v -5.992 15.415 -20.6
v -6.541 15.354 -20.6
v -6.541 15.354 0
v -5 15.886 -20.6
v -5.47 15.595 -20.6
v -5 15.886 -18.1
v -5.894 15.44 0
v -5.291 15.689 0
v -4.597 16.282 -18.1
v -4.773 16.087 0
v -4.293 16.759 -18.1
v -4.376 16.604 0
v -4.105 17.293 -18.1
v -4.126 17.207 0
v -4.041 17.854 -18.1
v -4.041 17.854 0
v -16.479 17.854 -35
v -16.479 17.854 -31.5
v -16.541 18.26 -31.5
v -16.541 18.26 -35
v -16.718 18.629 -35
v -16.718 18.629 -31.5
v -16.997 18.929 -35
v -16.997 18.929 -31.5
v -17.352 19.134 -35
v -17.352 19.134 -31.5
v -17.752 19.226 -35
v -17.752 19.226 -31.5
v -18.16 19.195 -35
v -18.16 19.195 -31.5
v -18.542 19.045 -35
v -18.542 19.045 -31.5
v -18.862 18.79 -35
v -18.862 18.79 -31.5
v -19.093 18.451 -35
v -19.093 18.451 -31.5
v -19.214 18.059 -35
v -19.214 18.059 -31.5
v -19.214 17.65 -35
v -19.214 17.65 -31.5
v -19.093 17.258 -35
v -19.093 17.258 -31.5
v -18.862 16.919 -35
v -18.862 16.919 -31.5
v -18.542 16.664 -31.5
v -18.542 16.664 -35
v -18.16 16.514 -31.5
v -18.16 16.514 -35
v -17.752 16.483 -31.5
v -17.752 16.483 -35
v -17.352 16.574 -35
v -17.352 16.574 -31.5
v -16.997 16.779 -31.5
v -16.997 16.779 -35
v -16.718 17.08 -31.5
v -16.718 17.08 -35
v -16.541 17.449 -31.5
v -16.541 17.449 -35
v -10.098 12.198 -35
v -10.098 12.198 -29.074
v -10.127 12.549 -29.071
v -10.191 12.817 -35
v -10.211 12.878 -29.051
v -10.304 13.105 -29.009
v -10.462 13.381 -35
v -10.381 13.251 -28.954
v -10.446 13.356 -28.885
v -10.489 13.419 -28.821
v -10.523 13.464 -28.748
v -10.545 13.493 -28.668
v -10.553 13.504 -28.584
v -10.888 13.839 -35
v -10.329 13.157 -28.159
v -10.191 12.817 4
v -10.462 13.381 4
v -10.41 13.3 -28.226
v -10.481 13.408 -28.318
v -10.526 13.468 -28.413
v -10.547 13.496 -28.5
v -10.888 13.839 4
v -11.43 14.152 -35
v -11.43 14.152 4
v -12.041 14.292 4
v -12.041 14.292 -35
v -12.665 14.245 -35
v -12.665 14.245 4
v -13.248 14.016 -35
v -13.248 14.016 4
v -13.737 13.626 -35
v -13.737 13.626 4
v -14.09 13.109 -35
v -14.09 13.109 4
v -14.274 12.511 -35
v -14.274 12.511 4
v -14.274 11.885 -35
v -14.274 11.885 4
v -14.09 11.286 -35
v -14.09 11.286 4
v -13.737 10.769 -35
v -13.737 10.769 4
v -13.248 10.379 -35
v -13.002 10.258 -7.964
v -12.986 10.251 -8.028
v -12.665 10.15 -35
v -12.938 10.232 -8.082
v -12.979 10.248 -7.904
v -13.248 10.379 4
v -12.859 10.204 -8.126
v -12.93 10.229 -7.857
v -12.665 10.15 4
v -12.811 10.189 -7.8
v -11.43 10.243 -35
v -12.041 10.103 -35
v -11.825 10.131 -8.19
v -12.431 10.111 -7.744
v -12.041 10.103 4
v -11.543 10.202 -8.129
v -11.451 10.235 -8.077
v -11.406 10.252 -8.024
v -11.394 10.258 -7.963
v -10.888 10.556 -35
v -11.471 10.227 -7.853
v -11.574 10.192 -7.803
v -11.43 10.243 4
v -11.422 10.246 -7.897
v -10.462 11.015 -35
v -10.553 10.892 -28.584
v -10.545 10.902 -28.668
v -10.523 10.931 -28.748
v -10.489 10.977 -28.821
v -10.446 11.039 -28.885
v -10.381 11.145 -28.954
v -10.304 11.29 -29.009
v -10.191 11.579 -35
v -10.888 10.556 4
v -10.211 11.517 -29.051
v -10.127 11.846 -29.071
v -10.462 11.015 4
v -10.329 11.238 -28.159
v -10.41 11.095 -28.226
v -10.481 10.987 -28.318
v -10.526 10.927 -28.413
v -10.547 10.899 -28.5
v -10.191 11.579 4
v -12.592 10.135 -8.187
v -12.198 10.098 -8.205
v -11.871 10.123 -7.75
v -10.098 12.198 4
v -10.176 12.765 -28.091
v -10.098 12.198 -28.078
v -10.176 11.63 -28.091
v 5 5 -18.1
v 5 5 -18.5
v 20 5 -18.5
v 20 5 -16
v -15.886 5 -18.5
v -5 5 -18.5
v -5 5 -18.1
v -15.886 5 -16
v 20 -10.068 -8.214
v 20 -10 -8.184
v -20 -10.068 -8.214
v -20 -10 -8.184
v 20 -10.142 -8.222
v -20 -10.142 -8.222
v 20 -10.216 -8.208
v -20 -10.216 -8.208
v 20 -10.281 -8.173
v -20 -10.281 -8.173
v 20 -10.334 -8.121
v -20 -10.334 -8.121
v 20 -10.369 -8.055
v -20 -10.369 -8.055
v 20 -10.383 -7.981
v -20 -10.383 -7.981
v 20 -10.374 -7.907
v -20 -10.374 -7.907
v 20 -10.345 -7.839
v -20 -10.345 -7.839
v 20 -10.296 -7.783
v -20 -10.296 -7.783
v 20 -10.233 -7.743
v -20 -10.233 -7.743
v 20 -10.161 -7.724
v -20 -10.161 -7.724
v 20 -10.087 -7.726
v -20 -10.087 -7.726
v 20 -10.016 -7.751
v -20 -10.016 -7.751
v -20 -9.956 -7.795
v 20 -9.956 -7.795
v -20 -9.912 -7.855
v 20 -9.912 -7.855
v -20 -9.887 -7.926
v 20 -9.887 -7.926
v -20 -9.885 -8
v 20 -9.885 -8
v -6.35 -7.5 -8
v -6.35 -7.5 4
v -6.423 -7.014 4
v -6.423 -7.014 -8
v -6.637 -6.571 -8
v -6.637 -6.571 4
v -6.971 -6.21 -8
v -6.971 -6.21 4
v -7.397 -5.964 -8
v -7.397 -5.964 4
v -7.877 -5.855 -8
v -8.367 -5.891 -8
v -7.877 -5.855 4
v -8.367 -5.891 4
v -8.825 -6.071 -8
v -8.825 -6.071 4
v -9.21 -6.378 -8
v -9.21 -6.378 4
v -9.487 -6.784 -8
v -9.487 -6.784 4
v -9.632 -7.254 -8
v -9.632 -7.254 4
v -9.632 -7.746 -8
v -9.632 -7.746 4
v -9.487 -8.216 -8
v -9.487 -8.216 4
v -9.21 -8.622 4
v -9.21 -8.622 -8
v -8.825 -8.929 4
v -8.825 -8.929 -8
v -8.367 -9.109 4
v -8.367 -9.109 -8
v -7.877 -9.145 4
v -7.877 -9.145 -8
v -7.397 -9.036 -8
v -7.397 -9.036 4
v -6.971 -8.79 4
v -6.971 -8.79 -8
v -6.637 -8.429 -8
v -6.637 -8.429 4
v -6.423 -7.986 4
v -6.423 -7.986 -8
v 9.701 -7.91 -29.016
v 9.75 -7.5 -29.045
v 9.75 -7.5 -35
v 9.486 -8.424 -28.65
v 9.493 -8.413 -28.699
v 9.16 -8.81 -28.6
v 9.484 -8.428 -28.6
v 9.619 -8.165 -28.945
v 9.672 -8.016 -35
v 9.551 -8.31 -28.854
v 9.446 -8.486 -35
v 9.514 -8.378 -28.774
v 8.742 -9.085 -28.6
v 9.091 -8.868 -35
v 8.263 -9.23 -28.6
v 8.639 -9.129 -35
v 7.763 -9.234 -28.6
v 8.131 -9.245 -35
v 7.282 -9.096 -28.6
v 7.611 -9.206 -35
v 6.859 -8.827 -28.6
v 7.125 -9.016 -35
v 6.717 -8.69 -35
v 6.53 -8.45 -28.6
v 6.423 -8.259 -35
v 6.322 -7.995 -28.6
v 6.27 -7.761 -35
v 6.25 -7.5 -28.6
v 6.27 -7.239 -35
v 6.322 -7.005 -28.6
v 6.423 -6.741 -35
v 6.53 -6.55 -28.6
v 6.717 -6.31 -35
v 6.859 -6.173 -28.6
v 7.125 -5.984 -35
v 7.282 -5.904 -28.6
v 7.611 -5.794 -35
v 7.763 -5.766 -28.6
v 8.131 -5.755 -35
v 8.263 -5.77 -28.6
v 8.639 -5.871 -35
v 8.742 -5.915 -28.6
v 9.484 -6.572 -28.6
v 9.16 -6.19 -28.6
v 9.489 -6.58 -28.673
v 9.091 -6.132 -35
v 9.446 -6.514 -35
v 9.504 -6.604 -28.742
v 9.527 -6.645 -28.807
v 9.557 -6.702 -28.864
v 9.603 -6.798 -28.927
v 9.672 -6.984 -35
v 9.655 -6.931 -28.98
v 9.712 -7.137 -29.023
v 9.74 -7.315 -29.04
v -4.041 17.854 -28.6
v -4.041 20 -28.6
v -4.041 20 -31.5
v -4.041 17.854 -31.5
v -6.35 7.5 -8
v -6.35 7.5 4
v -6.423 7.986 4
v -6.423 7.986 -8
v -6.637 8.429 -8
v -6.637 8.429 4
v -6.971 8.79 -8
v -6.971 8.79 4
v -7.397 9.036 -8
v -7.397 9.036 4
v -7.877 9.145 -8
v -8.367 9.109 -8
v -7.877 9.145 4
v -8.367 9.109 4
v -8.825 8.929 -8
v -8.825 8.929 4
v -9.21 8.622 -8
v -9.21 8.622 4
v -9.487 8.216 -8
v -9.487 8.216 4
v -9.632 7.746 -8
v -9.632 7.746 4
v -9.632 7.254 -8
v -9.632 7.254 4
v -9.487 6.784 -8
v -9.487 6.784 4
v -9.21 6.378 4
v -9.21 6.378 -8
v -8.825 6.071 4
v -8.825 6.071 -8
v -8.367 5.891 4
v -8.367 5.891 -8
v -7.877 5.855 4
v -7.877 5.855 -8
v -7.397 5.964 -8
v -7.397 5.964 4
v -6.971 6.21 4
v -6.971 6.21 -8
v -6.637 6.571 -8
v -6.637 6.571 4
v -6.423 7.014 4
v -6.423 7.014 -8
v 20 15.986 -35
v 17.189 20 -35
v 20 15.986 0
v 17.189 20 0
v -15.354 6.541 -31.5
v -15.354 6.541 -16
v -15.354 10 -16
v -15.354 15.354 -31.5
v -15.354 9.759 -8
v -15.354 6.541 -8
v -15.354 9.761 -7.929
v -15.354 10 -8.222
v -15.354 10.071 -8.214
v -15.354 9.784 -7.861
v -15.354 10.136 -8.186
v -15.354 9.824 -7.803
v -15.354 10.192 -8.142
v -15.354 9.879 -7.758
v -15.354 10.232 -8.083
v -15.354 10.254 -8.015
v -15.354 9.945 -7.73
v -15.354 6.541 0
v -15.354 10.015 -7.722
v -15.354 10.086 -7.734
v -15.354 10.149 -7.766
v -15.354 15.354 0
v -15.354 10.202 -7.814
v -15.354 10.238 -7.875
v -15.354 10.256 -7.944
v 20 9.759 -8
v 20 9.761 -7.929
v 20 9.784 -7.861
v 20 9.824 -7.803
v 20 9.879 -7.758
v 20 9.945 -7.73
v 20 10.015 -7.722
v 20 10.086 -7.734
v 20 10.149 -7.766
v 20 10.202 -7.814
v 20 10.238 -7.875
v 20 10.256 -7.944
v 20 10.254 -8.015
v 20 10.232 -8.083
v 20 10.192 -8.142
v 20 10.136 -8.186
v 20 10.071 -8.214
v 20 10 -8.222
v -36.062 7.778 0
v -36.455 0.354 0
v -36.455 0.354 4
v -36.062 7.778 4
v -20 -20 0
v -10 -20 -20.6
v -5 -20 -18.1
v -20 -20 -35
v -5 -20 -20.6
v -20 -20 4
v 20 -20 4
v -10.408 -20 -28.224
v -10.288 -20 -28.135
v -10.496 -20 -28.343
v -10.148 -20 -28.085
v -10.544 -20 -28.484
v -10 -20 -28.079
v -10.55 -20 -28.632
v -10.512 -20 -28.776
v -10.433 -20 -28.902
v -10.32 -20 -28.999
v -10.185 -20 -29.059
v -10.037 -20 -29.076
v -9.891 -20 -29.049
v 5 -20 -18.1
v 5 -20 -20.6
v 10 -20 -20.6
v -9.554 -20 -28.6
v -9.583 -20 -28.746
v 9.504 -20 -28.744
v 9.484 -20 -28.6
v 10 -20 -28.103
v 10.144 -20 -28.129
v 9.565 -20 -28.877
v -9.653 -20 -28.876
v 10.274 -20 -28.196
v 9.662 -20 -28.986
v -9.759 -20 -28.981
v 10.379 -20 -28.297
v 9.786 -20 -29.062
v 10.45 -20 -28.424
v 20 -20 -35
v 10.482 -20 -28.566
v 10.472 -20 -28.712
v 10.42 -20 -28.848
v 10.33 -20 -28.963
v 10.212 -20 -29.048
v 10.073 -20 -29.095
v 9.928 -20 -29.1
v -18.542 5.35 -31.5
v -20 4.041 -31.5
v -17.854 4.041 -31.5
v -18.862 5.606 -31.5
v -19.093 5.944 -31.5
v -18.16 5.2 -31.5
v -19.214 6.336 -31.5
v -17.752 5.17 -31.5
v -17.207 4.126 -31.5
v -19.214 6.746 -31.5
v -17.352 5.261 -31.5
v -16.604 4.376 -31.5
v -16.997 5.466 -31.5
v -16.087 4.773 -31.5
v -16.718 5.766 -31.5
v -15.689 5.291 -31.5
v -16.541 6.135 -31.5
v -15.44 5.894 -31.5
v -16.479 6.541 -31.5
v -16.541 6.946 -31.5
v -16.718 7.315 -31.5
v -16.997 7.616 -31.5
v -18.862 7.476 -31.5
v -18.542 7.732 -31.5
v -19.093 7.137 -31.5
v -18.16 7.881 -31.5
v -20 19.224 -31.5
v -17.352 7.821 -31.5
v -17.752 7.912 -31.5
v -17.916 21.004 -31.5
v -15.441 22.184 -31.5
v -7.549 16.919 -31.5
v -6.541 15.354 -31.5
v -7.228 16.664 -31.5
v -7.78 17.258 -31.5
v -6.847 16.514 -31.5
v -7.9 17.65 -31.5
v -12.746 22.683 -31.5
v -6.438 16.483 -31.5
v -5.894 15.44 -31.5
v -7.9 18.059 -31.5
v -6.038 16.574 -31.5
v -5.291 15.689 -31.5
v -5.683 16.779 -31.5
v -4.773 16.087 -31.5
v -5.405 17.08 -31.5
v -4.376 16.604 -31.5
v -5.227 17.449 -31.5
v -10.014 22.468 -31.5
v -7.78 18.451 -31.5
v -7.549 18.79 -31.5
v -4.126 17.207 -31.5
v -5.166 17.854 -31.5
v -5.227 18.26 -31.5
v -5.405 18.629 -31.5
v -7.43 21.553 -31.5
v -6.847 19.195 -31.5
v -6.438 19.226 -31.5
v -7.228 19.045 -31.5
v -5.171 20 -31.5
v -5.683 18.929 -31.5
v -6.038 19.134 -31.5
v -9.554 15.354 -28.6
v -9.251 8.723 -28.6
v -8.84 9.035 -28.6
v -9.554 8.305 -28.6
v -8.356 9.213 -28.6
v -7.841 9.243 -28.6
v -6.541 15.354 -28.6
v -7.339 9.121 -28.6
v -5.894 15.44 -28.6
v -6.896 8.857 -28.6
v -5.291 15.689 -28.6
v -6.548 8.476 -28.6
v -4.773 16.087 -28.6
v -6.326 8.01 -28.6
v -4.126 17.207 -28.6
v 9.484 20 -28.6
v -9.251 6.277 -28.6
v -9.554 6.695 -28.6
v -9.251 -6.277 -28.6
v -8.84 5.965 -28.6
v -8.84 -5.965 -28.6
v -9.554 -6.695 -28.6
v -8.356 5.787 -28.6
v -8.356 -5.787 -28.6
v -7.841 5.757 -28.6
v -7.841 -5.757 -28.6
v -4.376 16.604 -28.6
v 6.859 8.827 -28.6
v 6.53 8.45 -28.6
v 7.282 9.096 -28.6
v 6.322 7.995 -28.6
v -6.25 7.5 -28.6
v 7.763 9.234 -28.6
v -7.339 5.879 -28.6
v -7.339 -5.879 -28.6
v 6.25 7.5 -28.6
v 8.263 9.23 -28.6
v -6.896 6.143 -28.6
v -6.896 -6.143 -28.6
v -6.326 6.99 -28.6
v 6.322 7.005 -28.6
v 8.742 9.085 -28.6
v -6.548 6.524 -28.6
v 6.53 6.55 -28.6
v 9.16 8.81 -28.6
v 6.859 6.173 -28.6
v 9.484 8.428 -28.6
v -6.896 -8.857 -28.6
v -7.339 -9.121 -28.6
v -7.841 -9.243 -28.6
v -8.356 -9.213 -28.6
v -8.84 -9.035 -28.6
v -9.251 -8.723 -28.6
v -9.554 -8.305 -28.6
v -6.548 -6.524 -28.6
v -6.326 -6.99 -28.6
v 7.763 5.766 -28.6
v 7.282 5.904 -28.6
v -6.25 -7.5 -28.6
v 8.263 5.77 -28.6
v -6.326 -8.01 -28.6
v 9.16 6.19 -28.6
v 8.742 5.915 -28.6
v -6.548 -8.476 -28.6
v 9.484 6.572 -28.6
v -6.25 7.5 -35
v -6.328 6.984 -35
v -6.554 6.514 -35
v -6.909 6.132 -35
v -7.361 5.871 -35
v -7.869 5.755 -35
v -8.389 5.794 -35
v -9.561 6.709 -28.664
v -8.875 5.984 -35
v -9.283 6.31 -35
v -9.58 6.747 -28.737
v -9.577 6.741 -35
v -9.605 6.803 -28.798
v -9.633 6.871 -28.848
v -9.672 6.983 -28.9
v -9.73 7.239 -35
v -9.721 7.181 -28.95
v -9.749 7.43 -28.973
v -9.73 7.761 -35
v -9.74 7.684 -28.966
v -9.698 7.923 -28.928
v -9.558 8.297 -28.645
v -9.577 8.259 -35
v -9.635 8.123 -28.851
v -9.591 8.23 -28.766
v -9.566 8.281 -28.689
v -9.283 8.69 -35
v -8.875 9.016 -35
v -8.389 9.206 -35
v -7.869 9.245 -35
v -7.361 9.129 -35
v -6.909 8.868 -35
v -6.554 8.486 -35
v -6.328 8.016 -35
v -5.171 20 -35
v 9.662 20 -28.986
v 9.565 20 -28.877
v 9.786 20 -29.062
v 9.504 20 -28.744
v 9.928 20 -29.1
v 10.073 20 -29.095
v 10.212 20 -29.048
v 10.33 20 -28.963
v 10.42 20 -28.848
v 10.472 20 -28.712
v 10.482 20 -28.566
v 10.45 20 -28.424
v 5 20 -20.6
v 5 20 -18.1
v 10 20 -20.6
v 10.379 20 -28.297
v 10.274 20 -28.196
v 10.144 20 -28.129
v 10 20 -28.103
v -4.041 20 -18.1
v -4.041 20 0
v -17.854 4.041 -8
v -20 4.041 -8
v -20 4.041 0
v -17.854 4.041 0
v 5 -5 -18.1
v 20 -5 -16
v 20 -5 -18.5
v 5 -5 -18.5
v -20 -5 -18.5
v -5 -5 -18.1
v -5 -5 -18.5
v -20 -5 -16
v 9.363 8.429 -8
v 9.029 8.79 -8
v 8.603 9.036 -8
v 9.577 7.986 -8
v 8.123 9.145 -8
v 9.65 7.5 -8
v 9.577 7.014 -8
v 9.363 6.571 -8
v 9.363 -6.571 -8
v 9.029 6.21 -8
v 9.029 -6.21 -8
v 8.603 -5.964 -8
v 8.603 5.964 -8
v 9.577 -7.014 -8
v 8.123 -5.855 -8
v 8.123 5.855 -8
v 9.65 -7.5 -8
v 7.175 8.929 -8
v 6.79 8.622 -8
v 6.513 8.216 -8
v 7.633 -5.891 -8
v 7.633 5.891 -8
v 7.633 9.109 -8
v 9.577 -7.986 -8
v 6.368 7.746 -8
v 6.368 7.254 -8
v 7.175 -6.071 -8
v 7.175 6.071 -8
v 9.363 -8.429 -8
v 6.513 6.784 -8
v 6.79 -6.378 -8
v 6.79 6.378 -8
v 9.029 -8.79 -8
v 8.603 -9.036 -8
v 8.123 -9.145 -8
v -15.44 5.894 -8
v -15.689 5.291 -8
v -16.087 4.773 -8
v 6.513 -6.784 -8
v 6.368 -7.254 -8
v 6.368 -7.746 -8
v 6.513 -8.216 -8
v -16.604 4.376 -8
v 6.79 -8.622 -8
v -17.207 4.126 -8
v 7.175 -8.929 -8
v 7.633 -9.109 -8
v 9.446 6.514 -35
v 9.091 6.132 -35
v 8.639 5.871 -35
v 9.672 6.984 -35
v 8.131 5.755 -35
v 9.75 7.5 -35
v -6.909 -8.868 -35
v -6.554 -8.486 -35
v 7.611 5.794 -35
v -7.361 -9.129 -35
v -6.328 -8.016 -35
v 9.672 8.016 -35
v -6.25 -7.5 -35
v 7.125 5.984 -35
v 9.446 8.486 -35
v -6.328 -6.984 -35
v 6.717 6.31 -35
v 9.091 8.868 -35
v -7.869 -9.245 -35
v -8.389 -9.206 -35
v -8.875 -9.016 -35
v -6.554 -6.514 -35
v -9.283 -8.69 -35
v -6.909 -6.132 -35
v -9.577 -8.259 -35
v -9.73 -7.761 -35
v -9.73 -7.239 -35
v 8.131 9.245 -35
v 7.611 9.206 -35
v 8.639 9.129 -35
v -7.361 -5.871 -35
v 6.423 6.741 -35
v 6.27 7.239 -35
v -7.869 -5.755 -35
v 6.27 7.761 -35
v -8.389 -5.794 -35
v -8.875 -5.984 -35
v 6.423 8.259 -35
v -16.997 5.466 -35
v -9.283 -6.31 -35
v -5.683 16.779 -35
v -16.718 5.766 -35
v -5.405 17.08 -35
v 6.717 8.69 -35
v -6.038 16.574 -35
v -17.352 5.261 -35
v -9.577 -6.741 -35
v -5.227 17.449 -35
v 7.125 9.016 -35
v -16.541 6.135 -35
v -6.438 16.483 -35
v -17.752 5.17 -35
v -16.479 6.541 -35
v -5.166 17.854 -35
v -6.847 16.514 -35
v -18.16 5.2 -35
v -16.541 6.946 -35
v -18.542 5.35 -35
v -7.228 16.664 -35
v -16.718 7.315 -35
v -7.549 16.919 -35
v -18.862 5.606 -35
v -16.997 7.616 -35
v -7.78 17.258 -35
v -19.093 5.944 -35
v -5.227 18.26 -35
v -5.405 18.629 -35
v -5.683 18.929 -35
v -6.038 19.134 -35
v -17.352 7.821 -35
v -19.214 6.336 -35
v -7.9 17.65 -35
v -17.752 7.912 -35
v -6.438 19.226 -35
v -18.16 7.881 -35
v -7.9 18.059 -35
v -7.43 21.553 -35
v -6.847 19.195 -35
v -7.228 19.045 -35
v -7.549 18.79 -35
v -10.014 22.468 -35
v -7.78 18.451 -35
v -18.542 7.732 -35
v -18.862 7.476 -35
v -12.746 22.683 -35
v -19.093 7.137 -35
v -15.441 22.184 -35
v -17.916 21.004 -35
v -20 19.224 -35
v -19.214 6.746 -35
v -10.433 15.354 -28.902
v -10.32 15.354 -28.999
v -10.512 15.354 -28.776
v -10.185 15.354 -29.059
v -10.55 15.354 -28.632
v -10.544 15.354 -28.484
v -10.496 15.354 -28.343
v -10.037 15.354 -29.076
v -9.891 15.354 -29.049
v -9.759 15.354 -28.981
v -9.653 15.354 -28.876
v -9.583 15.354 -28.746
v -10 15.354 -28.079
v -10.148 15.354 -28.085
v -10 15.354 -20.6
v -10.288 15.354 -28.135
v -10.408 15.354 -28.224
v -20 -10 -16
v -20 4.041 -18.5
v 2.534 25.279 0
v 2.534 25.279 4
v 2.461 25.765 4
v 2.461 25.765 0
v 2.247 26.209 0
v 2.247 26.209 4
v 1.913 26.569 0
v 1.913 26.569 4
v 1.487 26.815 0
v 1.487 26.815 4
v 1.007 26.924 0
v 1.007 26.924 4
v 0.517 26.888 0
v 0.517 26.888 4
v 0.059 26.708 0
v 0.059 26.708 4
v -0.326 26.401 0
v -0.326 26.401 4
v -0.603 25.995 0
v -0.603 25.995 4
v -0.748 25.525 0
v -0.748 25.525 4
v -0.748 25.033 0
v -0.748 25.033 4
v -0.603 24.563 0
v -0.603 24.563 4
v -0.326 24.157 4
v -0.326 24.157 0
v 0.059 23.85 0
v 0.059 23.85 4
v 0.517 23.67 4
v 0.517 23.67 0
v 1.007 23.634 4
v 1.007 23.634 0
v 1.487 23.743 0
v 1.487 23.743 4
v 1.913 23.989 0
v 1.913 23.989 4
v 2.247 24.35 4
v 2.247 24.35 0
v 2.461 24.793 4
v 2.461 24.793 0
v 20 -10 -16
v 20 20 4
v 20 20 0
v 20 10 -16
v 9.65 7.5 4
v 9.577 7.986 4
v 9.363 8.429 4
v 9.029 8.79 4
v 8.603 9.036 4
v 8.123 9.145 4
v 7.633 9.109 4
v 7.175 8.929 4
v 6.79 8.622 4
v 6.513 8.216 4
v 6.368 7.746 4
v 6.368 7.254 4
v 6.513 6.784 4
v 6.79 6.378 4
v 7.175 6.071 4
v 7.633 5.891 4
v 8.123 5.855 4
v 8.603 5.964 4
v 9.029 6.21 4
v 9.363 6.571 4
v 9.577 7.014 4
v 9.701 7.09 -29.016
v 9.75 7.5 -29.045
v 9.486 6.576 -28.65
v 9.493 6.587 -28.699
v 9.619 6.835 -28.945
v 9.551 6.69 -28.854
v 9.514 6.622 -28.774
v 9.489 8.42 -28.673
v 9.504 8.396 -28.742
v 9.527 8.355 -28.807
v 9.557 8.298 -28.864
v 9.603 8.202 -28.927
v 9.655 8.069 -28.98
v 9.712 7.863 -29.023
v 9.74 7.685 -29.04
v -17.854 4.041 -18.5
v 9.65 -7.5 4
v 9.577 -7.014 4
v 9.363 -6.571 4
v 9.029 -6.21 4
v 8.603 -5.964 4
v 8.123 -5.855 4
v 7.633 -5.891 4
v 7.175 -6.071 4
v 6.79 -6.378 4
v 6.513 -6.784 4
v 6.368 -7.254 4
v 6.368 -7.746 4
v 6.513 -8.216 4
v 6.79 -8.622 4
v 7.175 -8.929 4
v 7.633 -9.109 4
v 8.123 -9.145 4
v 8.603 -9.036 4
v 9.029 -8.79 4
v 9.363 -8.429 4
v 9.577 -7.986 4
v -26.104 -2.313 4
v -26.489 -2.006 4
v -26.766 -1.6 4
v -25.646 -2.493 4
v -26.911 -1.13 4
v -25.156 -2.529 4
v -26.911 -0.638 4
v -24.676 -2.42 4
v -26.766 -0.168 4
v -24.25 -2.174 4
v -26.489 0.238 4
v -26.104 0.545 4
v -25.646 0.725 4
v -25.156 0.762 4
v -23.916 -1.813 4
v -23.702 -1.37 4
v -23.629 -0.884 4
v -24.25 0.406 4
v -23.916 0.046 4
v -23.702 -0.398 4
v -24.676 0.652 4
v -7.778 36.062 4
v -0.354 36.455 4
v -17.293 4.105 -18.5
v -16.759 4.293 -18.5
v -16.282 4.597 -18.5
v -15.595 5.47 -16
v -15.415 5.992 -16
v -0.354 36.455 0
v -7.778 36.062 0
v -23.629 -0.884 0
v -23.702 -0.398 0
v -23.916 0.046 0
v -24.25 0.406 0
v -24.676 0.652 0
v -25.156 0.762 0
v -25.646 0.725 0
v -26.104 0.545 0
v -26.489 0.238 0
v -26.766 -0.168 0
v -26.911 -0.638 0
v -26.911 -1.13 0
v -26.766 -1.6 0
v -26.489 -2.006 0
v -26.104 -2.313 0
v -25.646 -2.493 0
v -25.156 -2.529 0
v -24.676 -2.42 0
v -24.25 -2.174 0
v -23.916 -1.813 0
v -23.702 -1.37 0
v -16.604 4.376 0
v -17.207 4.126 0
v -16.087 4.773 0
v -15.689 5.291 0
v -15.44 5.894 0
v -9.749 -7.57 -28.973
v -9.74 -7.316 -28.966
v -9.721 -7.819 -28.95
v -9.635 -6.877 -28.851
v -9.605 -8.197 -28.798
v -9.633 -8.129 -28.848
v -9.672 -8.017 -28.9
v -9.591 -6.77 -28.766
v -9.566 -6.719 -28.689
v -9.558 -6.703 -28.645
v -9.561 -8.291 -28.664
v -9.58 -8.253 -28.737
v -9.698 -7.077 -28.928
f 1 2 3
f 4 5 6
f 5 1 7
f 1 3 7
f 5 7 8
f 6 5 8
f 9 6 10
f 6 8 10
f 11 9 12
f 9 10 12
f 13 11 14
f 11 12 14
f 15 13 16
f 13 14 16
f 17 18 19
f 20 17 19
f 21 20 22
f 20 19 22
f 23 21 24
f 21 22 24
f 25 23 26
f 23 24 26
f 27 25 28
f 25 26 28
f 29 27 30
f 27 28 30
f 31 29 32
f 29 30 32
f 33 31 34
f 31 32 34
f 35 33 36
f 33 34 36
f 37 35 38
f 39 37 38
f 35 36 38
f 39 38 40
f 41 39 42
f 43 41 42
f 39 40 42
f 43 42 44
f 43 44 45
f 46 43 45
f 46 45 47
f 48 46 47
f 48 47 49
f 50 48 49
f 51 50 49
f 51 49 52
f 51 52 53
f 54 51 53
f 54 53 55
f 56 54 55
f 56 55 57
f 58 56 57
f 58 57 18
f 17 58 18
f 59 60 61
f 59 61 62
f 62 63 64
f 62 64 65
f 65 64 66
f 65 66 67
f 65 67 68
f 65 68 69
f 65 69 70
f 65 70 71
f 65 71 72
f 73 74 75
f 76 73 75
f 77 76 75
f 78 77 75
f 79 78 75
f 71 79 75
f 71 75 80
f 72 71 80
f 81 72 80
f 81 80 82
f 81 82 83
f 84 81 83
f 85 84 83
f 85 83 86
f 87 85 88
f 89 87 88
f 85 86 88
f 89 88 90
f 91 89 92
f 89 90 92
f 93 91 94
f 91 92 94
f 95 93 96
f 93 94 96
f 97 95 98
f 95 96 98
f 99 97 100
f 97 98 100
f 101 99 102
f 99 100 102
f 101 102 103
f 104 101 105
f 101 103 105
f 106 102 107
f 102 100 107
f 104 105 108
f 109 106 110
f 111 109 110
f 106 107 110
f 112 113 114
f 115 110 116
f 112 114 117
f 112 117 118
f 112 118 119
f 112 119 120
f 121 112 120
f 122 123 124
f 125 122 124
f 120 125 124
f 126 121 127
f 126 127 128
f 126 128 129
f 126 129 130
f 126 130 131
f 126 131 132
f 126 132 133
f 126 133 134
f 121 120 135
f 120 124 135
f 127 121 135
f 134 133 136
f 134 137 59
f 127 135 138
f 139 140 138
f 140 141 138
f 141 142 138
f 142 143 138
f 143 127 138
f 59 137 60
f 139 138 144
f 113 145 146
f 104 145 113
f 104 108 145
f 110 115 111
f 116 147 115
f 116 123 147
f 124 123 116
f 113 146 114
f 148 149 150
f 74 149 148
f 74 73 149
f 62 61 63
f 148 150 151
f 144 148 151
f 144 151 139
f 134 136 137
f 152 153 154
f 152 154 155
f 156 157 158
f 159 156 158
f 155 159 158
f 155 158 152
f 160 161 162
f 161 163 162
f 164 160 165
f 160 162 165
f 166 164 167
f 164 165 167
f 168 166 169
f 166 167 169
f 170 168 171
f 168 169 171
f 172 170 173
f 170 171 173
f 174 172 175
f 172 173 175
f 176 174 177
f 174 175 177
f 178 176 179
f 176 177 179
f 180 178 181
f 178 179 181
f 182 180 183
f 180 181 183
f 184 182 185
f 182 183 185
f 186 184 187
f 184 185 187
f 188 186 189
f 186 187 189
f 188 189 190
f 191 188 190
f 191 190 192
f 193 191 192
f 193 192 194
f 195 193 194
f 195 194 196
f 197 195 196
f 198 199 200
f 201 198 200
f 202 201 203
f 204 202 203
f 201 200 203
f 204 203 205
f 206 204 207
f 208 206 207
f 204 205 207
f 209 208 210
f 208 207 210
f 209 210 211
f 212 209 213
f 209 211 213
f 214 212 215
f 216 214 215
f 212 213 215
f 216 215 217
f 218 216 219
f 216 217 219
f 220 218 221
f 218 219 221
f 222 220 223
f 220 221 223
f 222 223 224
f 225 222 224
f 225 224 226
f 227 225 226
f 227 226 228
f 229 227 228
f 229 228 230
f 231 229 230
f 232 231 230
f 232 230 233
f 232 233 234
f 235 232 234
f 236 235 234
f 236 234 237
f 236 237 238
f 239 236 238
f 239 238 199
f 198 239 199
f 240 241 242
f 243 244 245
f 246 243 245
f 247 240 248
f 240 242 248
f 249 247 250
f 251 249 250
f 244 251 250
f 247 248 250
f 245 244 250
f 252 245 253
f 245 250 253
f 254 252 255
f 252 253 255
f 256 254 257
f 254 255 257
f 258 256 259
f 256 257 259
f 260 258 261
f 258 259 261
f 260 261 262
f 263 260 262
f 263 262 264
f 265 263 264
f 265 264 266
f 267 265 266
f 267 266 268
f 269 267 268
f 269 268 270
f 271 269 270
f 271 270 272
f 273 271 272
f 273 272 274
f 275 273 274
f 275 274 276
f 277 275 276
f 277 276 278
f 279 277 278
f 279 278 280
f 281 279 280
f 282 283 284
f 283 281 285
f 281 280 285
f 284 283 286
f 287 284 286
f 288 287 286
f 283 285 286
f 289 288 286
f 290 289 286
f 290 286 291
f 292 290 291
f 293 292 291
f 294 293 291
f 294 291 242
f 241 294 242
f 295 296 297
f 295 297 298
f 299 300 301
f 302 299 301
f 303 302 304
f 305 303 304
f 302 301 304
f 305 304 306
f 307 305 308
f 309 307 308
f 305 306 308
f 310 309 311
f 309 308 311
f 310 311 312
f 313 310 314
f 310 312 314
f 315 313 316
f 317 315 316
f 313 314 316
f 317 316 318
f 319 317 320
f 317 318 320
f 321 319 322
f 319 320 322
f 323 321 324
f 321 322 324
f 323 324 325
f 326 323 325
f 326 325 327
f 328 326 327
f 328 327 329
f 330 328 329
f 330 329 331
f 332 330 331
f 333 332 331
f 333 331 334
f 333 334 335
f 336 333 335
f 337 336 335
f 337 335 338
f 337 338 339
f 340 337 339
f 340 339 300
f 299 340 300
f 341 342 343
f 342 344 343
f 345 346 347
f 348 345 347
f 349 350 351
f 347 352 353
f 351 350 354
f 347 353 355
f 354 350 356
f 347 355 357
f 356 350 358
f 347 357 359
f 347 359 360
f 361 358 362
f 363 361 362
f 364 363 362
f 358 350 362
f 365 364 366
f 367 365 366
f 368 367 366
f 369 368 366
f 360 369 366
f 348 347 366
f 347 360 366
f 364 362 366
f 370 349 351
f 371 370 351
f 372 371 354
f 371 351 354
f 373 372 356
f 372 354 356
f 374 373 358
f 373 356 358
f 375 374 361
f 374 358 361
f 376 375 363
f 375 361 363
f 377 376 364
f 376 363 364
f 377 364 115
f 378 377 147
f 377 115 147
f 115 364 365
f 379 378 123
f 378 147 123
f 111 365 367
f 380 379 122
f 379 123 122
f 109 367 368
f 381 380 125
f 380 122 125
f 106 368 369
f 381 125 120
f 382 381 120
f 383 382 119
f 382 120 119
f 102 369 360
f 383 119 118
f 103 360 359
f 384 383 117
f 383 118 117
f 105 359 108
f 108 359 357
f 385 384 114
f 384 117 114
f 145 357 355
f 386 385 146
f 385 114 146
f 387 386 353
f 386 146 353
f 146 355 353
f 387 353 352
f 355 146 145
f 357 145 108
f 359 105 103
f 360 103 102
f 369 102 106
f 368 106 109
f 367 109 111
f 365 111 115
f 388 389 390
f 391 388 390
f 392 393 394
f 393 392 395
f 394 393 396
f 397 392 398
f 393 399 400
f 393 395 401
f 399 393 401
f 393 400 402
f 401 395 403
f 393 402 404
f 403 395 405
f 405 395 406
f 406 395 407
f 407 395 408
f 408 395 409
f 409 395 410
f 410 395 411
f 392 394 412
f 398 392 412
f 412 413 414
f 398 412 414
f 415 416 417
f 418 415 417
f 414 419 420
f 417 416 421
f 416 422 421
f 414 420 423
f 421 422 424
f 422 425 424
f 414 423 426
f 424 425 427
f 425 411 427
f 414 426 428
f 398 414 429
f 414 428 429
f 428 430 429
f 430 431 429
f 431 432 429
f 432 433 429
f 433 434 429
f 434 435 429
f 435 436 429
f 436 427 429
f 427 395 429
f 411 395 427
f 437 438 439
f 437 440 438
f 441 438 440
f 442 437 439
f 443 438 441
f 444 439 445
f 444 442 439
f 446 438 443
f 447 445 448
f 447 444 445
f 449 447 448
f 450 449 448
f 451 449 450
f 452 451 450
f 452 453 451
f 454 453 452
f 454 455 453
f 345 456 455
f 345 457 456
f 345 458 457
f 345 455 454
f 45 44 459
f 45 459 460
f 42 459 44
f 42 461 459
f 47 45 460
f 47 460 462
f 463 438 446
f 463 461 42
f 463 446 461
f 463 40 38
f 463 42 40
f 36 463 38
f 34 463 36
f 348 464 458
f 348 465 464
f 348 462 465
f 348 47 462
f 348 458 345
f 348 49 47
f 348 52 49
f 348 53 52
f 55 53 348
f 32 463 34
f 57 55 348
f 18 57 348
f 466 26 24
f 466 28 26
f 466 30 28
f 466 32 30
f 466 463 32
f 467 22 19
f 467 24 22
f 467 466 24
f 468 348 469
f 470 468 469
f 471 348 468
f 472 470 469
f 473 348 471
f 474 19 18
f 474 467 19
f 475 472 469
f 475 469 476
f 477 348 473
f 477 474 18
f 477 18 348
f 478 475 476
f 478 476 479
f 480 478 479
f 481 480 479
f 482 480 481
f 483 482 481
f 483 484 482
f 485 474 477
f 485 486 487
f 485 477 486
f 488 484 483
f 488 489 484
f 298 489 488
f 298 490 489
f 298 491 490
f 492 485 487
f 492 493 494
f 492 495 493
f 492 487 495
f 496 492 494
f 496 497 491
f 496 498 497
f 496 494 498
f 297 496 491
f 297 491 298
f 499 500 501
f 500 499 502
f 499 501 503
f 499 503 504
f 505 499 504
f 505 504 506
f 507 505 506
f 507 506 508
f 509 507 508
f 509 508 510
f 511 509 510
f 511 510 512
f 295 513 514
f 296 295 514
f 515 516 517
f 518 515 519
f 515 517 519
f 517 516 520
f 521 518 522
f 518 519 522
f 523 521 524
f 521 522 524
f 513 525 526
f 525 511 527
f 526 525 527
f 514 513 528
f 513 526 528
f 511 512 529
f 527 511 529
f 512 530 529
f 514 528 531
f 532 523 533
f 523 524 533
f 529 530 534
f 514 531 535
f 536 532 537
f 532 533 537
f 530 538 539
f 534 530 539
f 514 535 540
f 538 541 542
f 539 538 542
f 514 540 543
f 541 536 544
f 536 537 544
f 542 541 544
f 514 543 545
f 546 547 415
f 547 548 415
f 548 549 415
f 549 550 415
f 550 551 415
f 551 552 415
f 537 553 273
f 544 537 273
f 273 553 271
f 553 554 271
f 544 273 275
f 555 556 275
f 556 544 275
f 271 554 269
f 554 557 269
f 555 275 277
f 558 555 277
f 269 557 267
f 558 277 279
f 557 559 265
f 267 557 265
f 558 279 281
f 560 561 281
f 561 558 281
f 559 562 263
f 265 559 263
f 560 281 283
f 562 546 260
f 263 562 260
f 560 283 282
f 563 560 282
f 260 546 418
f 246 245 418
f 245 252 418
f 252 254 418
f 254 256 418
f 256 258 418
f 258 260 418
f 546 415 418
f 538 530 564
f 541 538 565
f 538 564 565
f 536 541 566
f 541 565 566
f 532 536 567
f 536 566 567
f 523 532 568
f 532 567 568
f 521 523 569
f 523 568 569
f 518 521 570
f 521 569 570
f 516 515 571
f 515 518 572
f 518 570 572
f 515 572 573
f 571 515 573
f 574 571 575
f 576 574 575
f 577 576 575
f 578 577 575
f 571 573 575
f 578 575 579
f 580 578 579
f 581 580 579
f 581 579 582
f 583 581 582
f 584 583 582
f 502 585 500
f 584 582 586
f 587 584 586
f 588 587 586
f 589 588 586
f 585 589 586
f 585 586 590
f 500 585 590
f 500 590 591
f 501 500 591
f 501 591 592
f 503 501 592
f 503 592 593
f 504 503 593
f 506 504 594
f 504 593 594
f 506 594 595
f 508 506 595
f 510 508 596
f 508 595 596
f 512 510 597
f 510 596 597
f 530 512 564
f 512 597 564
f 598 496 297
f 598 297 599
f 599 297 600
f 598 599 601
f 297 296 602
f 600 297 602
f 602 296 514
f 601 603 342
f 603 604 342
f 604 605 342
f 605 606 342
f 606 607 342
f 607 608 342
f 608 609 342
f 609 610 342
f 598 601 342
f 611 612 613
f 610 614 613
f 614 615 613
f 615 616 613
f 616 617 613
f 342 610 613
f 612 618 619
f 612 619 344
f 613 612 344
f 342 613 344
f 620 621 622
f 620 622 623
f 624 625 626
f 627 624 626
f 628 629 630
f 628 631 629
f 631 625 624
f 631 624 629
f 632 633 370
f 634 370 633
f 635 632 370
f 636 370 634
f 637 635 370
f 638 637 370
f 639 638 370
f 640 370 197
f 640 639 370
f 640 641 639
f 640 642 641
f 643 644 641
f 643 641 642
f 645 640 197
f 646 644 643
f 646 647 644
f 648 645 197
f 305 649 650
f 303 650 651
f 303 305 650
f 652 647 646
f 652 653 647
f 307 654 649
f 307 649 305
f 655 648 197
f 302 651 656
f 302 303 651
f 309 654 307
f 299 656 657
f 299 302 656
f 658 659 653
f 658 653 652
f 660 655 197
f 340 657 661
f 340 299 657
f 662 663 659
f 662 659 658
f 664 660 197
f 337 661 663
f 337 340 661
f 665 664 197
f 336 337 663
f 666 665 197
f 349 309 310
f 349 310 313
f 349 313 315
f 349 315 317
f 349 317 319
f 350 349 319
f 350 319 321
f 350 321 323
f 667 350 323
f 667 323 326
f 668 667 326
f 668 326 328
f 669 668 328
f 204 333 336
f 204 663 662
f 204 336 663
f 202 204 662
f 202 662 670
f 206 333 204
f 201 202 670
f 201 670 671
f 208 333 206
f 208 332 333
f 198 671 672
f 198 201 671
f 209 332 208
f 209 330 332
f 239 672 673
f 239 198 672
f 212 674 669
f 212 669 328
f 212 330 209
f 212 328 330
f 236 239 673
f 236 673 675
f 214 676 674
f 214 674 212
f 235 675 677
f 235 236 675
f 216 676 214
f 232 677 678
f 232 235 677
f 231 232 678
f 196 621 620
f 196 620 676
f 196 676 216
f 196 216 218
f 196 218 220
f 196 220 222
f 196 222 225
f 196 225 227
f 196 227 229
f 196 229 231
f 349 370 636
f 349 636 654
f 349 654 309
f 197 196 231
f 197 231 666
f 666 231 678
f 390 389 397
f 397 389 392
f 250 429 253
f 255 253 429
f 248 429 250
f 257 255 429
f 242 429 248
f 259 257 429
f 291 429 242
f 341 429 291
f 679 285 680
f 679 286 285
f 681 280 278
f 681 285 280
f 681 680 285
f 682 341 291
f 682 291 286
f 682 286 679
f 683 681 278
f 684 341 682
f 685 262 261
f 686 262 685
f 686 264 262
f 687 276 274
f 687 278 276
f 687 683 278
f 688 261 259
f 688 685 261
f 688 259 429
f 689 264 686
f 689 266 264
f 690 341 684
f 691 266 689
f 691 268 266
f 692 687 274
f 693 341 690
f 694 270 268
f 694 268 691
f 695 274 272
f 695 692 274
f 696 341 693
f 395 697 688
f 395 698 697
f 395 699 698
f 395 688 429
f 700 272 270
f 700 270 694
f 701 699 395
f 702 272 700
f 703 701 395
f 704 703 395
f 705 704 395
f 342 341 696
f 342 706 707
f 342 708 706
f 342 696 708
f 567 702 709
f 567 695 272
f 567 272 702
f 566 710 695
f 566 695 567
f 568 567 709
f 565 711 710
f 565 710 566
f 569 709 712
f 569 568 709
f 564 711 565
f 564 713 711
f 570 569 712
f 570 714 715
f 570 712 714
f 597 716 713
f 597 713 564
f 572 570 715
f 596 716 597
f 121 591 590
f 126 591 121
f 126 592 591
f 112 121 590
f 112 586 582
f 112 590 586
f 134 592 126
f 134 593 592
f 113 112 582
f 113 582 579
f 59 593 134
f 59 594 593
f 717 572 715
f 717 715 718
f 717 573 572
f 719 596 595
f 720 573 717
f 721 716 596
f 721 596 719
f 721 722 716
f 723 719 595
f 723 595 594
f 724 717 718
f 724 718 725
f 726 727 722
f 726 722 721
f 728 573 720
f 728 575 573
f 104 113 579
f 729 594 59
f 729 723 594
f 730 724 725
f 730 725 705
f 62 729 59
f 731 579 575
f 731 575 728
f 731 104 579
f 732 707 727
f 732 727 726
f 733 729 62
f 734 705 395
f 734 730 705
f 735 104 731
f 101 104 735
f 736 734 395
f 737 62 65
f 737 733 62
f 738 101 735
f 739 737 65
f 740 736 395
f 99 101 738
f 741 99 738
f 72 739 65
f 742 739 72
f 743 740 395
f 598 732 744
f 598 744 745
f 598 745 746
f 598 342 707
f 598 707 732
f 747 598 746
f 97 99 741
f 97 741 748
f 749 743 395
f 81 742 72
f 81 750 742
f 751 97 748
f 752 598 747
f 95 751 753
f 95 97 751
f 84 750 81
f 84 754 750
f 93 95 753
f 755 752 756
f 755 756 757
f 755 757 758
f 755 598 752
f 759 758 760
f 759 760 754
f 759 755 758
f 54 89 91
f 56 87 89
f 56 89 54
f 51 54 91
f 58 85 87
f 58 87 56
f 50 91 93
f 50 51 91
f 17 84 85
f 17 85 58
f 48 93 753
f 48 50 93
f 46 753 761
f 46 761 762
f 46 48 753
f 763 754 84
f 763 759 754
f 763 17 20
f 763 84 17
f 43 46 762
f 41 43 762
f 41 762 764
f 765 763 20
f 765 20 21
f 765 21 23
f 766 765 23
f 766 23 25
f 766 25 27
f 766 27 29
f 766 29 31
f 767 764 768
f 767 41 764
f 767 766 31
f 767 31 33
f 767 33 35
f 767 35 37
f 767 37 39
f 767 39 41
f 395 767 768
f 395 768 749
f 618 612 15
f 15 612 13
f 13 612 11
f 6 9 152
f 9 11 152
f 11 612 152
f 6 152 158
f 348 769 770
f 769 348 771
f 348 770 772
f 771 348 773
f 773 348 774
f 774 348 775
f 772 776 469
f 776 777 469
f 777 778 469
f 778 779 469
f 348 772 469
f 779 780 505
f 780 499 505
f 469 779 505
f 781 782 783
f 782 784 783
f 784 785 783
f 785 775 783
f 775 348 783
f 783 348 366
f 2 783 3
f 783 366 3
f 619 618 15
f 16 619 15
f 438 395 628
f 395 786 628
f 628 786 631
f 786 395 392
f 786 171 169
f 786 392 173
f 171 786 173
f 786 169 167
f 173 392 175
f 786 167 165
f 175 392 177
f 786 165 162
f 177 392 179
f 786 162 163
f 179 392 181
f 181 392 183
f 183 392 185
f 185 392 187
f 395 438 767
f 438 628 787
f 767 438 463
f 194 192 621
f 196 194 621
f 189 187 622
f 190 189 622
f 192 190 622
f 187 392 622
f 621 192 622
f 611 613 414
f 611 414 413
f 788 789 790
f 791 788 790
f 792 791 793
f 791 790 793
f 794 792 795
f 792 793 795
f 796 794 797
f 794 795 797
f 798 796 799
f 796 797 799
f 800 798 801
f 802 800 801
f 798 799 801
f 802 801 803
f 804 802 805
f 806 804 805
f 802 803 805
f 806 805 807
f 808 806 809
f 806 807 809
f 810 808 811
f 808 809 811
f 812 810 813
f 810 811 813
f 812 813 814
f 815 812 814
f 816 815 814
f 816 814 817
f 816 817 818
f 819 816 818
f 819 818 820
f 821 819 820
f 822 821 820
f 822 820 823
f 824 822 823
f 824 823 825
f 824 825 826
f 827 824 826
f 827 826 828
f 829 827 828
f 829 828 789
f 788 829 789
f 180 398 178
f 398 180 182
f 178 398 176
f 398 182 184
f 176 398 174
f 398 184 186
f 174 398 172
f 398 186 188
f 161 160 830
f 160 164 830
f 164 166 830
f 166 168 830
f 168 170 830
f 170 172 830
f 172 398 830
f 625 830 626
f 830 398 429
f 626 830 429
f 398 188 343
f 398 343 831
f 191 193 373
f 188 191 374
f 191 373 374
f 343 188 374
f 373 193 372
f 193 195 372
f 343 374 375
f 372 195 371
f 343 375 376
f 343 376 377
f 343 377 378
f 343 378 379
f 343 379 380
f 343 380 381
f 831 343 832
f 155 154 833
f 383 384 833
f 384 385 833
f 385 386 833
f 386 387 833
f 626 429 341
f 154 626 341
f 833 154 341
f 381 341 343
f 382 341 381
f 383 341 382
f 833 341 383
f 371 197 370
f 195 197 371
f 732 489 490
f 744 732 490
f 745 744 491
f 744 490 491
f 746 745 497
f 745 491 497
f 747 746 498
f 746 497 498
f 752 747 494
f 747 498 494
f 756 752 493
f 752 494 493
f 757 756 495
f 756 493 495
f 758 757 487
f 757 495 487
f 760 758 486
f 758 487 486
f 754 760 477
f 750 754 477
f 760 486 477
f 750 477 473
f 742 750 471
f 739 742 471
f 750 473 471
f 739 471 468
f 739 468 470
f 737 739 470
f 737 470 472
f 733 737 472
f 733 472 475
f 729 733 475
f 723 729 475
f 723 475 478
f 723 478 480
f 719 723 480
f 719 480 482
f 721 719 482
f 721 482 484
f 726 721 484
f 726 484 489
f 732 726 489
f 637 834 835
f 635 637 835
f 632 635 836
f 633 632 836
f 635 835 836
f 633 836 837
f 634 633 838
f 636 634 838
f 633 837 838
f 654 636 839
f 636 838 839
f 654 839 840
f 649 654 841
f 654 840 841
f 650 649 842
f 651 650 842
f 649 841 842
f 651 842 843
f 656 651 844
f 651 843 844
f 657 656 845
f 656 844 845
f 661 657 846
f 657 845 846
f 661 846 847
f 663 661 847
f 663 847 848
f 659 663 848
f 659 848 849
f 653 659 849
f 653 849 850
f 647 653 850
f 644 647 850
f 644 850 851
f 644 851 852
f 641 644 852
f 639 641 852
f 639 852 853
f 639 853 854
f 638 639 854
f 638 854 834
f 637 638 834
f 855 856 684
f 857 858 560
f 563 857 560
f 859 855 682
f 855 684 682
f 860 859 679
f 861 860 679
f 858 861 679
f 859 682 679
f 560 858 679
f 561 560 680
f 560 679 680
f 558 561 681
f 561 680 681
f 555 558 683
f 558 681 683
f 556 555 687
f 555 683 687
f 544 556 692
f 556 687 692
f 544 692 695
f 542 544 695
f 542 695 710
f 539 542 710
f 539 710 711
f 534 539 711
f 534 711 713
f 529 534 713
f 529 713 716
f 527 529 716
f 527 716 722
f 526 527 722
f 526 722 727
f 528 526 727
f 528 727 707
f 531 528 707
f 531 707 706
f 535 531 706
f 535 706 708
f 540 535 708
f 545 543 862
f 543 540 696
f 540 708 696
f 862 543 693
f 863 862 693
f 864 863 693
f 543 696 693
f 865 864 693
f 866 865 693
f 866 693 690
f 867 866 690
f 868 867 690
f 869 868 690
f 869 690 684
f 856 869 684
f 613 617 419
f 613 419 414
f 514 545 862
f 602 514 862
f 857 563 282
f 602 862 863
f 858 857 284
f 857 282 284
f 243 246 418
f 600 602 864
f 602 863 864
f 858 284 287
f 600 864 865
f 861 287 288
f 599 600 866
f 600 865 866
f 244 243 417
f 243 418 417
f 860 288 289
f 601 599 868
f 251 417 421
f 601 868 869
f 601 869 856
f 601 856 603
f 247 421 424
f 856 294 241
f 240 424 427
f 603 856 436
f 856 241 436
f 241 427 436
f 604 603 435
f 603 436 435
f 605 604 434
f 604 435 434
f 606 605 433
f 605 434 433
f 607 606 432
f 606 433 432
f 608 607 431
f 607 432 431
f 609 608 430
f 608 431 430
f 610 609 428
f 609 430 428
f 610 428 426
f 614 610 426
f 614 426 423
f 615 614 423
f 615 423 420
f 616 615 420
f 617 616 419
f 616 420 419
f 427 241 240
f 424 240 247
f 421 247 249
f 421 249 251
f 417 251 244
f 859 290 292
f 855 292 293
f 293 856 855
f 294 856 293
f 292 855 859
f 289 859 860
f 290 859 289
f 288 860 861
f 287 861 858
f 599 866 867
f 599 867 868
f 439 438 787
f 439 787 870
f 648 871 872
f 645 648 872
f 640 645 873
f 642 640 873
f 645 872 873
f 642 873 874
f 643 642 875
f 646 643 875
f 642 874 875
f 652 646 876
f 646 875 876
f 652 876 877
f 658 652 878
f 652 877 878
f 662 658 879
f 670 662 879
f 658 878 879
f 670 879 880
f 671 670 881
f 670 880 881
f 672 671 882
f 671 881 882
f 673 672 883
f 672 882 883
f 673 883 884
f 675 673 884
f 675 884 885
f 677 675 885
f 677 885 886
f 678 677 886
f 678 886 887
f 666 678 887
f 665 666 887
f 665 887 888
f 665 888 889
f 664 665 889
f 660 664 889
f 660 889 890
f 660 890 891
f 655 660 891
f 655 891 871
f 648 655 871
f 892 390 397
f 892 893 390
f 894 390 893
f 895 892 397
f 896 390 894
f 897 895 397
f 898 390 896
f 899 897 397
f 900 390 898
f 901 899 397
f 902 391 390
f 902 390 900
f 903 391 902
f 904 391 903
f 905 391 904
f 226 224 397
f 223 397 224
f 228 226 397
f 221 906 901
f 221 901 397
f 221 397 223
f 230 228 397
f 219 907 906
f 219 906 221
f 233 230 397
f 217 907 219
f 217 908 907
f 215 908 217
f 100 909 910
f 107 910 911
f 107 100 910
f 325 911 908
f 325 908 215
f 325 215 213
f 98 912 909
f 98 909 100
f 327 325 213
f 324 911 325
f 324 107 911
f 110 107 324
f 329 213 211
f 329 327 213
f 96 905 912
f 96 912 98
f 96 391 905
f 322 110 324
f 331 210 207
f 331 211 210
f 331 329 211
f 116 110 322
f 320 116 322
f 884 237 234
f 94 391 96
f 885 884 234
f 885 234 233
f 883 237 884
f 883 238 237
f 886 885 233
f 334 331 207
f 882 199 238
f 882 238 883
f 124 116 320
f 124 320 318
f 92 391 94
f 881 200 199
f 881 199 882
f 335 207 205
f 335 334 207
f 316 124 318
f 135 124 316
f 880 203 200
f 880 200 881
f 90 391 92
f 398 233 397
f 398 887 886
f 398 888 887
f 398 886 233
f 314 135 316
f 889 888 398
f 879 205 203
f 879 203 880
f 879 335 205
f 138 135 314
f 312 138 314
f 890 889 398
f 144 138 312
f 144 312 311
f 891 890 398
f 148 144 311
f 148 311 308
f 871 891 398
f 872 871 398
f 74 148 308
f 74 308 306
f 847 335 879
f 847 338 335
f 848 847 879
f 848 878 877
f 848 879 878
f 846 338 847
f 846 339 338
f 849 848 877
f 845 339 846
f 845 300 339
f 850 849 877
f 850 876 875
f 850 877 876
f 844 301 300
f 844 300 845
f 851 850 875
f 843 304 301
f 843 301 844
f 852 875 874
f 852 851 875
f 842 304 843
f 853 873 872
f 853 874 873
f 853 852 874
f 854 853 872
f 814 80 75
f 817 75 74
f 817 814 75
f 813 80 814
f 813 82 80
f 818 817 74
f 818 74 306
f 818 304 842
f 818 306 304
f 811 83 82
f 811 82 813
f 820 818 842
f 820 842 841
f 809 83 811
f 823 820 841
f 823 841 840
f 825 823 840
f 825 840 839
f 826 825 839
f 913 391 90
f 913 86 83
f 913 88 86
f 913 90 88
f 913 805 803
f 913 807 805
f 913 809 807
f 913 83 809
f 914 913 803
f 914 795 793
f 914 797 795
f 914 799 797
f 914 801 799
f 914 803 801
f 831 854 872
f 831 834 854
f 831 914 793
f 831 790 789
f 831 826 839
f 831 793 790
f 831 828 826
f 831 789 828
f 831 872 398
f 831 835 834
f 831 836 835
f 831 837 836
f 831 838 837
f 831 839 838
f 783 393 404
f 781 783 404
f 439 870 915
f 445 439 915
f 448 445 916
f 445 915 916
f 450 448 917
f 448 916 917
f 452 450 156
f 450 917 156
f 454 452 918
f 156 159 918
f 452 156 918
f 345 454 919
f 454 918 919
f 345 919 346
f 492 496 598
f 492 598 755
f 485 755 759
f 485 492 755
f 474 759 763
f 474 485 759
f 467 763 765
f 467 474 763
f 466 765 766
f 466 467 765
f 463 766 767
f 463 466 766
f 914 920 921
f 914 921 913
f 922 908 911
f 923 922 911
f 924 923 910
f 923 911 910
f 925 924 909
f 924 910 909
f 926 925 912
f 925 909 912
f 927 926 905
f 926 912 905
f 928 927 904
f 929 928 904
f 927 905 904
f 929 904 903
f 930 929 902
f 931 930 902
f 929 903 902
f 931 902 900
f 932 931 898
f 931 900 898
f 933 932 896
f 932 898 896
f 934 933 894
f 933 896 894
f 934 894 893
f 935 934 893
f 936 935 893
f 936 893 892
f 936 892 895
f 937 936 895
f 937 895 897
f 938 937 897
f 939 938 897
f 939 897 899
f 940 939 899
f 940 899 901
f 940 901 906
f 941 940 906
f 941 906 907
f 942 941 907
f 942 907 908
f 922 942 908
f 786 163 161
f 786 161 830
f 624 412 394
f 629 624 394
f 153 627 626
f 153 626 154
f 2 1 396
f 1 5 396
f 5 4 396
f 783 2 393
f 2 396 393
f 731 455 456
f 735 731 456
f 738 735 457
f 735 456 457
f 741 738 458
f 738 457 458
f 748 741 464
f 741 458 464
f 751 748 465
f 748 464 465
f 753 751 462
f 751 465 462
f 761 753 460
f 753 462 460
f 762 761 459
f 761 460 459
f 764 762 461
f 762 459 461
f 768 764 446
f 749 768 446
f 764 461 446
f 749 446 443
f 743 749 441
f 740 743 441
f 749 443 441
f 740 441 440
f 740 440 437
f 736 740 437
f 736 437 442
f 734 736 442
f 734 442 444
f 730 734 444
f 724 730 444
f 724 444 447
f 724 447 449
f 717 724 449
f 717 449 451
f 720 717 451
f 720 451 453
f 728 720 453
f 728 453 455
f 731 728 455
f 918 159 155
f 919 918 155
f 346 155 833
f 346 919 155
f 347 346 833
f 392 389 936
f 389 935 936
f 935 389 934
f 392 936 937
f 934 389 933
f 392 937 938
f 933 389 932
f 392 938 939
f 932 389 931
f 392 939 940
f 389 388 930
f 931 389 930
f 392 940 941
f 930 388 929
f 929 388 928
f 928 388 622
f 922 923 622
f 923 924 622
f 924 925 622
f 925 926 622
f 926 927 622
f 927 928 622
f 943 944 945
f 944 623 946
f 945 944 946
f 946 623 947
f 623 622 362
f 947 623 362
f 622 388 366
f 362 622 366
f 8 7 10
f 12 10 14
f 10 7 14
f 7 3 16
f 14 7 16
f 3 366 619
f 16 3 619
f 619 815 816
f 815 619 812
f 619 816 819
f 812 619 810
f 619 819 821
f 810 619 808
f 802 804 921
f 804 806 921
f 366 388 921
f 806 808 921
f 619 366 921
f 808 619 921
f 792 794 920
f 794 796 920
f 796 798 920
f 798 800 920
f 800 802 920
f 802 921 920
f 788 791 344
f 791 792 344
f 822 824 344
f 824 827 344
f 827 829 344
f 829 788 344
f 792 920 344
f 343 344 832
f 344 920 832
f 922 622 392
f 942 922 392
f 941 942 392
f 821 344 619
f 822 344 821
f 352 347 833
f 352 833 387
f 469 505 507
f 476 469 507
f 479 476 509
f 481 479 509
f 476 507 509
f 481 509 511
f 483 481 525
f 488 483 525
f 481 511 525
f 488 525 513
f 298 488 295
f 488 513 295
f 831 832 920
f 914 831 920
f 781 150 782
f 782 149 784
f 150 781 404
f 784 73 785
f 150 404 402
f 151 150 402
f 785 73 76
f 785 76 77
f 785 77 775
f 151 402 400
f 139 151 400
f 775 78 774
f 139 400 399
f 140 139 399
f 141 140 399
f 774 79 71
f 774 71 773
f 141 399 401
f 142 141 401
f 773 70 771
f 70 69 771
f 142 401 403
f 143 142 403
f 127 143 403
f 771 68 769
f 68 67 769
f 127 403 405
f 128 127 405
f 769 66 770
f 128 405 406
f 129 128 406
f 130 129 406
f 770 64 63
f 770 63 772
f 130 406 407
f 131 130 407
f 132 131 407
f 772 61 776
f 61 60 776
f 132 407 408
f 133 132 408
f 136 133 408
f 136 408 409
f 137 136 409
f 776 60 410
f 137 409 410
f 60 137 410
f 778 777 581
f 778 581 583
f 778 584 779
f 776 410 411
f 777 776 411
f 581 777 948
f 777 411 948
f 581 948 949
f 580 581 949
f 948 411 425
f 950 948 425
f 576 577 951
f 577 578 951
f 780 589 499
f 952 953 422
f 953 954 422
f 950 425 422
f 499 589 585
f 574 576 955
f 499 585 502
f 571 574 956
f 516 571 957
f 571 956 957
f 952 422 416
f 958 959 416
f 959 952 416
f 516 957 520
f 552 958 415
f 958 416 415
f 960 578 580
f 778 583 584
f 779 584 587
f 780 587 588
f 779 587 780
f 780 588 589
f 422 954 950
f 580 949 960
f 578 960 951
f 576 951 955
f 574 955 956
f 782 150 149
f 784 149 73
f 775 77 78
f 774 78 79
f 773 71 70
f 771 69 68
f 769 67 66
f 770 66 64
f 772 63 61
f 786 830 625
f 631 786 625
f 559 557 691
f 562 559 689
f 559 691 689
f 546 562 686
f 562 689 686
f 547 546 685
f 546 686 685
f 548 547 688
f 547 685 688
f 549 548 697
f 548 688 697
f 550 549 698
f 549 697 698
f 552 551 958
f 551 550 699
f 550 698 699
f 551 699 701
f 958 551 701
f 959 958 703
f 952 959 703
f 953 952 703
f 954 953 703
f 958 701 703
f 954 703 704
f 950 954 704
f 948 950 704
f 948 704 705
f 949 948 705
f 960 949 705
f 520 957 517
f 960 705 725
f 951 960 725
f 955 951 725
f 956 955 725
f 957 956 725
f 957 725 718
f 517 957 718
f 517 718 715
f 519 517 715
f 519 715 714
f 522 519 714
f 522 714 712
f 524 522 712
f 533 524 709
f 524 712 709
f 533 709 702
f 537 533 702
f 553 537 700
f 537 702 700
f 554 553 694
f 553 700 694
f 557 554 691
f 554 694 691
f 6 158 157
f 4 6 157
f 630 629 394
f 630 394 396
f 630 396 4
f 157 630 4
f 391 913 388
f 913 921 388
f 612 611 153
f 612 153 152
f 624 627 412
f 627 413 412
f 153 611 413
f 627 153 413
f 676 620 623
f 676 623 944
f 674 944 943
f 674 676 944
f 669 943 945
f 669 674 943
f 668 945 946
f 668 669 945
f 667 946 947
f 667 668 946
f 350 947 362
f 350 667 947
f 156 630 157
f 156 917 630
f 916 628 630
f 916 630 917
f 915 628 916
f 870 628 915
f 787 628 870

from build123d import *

# Parameters (mm, degrees)
PAD_DEPTH            = 35
POCKET_DEPTH         = 40.001
POCKET001_DEPTH      = 42.698592
SKETCH021_W          = 20
SKETCH021_H          = 20
POCKET002_DEPTH      = 3
POCKET002_DEPTH_BACK = -2
SKETCH016_R          = 0.5
POCKET003_DEPTH      = 42.698592
SKETCH015_R          = 0.25
POCKET004_DEPTH      = 40.001
POCKET005_DEPTH      = 37.501
PAD001_DEPTH         = 4
SKETCH024_R          = 1.65
POCKET006_DEPTH      = 39.001
SKETCH008_R          = 2.1
POCKET007_DEPTH      = 39.001
SKETCH003_R          = 1.65
POCKET008_DEPTH      = 16
SKETCH004_R          = 1.75
POCKET009_DEPTH      = 13
POCKET010_DEPTH      = 15.5
POCKET010_DEPTH_BACK = -16
SKETCH017_R          = 1.375
POCKET011_DEPTH      = 13.001
CHAMFER_SIZE         = 5


with BuildPart() as part:
    # Sketch → Pad (new body)
    with BuildSketch(Plane.XY):
        with BuildLine():
            Line((20, 20), (20, -20))
            Line((20, -20), (-20, -20))
            Line((-20, -20), (-20, 19.224144))
            ThreePointArc((-5.17104, 20), (-12.746205, 22.68325), (-20, 19.224144))
            Line((-5.17104, 20), (20, 20))
        make_face()
    extrude(amount=-PAD_DEPTH)

    # Sketch001 (on Face3 of Pad) → Pocket (cut, through all)
    with BuildSketch(Plane(origin=(-20, 0, 0), x_dir=(0, -1, 0), z_dir=(-1, 0, 0))):
        Polygon((-10, -8), (10, -8), (10, -16), (5, -16), (5, -18.5), (-5, -18.5), (-5, -16), (-10, -16), align=None)
    extrude(amount=-POCKET_DEPTH, mode=Mode.SUBTRACT)

    # Sketch019 (on Face5 of Pocket) → Pocket001 (cut, through all)
    with BuildSketch(Plane.XZ.offset(20)):
        Polygon((-10, -20.6), (-10, -28.6), (10, -28.6), (10, -20.6), (5, -20.6), (5, -18.1), (-5, -18.1), (-5, -20.6), align=None)
    extrude(amount=-POCKET001_DEPTH, mode=Mode.SUBTRACT)

    # Sketch021 → Pocket002 (cut, two sides)
    with BuildSketch(Plane.XY.offset(-12)) as pocket002_sk:
        Rectangle(SKETCH021_W, SKETCH021_H)
    extrude(amount=-POCKET002_DEPTH, mode=Mode.SUBTRACT)
    extrude(pocket002_sk.sketch, amount=-POCKET002_DEPTH_BACK, mode=Mode.SUBTRACT)

    # Sketch016 (on Face5 of Pocket002) → Pocket003 (cut, through all)
    with BuildSketch(Plane.XZ.offset(20)):
        with Locations((9.983657, -28.602995)):
            Circle(SKETCH016_R)
        with Locations((-10.053121, -28.576208)):
            Circle(SKETCH016_R)
    extrude(amount=-POCKET003_DEPTH, mode=Mode.SUBTRACT)

    # Sketch015 (on Face24 of Pocket003) → Pocket004 (cut, through all)
    with BuildSketch(Plane(origin=(-20, 0, 0), x_dir=(0, -1, 0), z_dir=(-1, 0, 0))):
        with Locations((-10.007711, -7.972068)):
            Circle(SKETCH015_R)
        with Locations((10.132993, -7.972068)):
            Circle(SKETCH015_R)
    extrude(amount=-POCKET004_DEPTH, mode=Mode.SUBTRACT)

    # Sketch025 → Pocket005 (cut, through all)
    with BuildSketch(Plane.XY.offset(2.5)):
        Polygon((10.336529, 29.786797), (28.676373, 3.594785), (36.756538, 10.988299), (24.594908, 30.303831), align=None)
    extrude(amount=-POCKET005_DEPTH, mode=Mode.SUBTRACT)

    # Sketch007 → Pad001 (join)
    with BuildSketch(Plane.XY):
        Polygon((20, -20), (20, 20), (-4.242641, 39.59798), (-39.59798, 4.242641), (-20, -20), align=None)
    extrude(amount=PAD001_DEPTH)

    # Sketch024 → Pocket006 (cut, through all)
    with BuildSketch(Plane.XY.offset(4)):
        with Locations((0.883883, 25.279067)):
            Circle(SKETCH024_R)
        with Locations((-25.279067, -0.883883)):
            Circle(SKETCH024_R)
    extrude(amount=-POCKET006_DEPTH, mode=Mode.SUBTRACT)

    # Sketch008 → Pocket007 (cut, through all)
    with BuildSketch(Plane.XY.offset(4)):
        with Locations((-12.197592, 12.197592)):
            Circle(SKETCH008_R)
    extrude(amount=-POCKET007_DEPTH, mode=Mode.SUBTRACT)

    # Sketch003 → Pocket008 (cut)
    with BuildSketch(Plane.XY.offset(4)):
        with Locations((-8, 7.5)):
            Circle(SKETCH003_R)
        with Locations((8, 7.5)):
            Circle(SKETCH003_R)
        with Locations((-8, -7.5)):
            Circle(SKETCH003_R)
        with Locations((8, -7.5)):
            Circle(SKETCH003_R)
    extrude(amount=-POCKET008_DEPTH, mode=Mode.SUBTRACT)

    # Sketch004 (on Face4 of Pocket008) → Pocket009 (cut)
    with BuildSketch(Plane(origin=(0, 0, -35), x_dir=(1, 0, 0), z_dir=(0, 0, -1))):
        with Locations((-8, 7.5)):
            Circle(SKETCH004_R)
        with Locations((8, 7.5)):
            Circle(SKETCH004_R)
        with Locations((-8, -7.5)):
            Circle(SKETCH004_R)
        with Locations((8, -7.5)):
            Circle(SKETCH004_R)
    extrude(amount=-POCKET009_DEPTH, mode=Mode.SUBTRACT)

    # Sketch022 (on Face6 of Pocket009) → Pocket010 (cut, two sides)
    with BuildSketch(Plane.XY.offset(-16)) as pocket010_sk:
        with BuildLine():
            ThreePointArc((-17.854446, 4.040738), (-16.086679, 4.772971), (-15.354446, 6.540738))
            Line((-15.354446, 6.540738), (-15.354446, 15.354446))
            Line((-15.354446, 15.354446), (-6.540738, 15.354446))
            ThreePointArc((-6.540738, 15.354446), (-4.772971, 16.086679), (-4.040738, 17.854446))
            Line((-4.040738, 22.984446), (-4.040738, 17.854446))
            Line((-22.234446, 22.984446), (-4.040738, 22.984446))
            Line((-22.234446, 4.040738), (-22.234446, 22.984446))
            Line((-22.234446, 4.040738), (-17.854446, 4.040738))
        make_face()
    extrude(amount=-POCKET010_DEPTH, mode=Mode.SUBTRACT)
    extrude(pocket010_sk.sketch, amount=-POCKET010_DEPTH_BACK, mode=Mode.SUBTRACT)

    # Sketch017 → Pocket011 (cut, through all)
    with BuildSketch(Plane.XY.offset(-22)):
        with Locations((-6.540738, 17.854446)):
            Circle(SKETCH017_R)
        with Locations((-17.854446, 6.540738)):
            Circle(SKETCH017_R)
        with Locations((-17.854446, 17.854446)):
            Circle(SKETCH017_R)
    extrude(amount=-POCKET011_DEPTH, mode=Mode.SUBTRACT)

    # Chamfer
    chamfer_edges = [part.edges().sort_by_distance(p)[0] for p in [
        (-4.242641, 39.59798, 2),
        (-39.59798, 4.242641, 2),
    ]]
    chamfer(chamfer_edges, length=CHAMFER_SIZE)


solid = part.part
